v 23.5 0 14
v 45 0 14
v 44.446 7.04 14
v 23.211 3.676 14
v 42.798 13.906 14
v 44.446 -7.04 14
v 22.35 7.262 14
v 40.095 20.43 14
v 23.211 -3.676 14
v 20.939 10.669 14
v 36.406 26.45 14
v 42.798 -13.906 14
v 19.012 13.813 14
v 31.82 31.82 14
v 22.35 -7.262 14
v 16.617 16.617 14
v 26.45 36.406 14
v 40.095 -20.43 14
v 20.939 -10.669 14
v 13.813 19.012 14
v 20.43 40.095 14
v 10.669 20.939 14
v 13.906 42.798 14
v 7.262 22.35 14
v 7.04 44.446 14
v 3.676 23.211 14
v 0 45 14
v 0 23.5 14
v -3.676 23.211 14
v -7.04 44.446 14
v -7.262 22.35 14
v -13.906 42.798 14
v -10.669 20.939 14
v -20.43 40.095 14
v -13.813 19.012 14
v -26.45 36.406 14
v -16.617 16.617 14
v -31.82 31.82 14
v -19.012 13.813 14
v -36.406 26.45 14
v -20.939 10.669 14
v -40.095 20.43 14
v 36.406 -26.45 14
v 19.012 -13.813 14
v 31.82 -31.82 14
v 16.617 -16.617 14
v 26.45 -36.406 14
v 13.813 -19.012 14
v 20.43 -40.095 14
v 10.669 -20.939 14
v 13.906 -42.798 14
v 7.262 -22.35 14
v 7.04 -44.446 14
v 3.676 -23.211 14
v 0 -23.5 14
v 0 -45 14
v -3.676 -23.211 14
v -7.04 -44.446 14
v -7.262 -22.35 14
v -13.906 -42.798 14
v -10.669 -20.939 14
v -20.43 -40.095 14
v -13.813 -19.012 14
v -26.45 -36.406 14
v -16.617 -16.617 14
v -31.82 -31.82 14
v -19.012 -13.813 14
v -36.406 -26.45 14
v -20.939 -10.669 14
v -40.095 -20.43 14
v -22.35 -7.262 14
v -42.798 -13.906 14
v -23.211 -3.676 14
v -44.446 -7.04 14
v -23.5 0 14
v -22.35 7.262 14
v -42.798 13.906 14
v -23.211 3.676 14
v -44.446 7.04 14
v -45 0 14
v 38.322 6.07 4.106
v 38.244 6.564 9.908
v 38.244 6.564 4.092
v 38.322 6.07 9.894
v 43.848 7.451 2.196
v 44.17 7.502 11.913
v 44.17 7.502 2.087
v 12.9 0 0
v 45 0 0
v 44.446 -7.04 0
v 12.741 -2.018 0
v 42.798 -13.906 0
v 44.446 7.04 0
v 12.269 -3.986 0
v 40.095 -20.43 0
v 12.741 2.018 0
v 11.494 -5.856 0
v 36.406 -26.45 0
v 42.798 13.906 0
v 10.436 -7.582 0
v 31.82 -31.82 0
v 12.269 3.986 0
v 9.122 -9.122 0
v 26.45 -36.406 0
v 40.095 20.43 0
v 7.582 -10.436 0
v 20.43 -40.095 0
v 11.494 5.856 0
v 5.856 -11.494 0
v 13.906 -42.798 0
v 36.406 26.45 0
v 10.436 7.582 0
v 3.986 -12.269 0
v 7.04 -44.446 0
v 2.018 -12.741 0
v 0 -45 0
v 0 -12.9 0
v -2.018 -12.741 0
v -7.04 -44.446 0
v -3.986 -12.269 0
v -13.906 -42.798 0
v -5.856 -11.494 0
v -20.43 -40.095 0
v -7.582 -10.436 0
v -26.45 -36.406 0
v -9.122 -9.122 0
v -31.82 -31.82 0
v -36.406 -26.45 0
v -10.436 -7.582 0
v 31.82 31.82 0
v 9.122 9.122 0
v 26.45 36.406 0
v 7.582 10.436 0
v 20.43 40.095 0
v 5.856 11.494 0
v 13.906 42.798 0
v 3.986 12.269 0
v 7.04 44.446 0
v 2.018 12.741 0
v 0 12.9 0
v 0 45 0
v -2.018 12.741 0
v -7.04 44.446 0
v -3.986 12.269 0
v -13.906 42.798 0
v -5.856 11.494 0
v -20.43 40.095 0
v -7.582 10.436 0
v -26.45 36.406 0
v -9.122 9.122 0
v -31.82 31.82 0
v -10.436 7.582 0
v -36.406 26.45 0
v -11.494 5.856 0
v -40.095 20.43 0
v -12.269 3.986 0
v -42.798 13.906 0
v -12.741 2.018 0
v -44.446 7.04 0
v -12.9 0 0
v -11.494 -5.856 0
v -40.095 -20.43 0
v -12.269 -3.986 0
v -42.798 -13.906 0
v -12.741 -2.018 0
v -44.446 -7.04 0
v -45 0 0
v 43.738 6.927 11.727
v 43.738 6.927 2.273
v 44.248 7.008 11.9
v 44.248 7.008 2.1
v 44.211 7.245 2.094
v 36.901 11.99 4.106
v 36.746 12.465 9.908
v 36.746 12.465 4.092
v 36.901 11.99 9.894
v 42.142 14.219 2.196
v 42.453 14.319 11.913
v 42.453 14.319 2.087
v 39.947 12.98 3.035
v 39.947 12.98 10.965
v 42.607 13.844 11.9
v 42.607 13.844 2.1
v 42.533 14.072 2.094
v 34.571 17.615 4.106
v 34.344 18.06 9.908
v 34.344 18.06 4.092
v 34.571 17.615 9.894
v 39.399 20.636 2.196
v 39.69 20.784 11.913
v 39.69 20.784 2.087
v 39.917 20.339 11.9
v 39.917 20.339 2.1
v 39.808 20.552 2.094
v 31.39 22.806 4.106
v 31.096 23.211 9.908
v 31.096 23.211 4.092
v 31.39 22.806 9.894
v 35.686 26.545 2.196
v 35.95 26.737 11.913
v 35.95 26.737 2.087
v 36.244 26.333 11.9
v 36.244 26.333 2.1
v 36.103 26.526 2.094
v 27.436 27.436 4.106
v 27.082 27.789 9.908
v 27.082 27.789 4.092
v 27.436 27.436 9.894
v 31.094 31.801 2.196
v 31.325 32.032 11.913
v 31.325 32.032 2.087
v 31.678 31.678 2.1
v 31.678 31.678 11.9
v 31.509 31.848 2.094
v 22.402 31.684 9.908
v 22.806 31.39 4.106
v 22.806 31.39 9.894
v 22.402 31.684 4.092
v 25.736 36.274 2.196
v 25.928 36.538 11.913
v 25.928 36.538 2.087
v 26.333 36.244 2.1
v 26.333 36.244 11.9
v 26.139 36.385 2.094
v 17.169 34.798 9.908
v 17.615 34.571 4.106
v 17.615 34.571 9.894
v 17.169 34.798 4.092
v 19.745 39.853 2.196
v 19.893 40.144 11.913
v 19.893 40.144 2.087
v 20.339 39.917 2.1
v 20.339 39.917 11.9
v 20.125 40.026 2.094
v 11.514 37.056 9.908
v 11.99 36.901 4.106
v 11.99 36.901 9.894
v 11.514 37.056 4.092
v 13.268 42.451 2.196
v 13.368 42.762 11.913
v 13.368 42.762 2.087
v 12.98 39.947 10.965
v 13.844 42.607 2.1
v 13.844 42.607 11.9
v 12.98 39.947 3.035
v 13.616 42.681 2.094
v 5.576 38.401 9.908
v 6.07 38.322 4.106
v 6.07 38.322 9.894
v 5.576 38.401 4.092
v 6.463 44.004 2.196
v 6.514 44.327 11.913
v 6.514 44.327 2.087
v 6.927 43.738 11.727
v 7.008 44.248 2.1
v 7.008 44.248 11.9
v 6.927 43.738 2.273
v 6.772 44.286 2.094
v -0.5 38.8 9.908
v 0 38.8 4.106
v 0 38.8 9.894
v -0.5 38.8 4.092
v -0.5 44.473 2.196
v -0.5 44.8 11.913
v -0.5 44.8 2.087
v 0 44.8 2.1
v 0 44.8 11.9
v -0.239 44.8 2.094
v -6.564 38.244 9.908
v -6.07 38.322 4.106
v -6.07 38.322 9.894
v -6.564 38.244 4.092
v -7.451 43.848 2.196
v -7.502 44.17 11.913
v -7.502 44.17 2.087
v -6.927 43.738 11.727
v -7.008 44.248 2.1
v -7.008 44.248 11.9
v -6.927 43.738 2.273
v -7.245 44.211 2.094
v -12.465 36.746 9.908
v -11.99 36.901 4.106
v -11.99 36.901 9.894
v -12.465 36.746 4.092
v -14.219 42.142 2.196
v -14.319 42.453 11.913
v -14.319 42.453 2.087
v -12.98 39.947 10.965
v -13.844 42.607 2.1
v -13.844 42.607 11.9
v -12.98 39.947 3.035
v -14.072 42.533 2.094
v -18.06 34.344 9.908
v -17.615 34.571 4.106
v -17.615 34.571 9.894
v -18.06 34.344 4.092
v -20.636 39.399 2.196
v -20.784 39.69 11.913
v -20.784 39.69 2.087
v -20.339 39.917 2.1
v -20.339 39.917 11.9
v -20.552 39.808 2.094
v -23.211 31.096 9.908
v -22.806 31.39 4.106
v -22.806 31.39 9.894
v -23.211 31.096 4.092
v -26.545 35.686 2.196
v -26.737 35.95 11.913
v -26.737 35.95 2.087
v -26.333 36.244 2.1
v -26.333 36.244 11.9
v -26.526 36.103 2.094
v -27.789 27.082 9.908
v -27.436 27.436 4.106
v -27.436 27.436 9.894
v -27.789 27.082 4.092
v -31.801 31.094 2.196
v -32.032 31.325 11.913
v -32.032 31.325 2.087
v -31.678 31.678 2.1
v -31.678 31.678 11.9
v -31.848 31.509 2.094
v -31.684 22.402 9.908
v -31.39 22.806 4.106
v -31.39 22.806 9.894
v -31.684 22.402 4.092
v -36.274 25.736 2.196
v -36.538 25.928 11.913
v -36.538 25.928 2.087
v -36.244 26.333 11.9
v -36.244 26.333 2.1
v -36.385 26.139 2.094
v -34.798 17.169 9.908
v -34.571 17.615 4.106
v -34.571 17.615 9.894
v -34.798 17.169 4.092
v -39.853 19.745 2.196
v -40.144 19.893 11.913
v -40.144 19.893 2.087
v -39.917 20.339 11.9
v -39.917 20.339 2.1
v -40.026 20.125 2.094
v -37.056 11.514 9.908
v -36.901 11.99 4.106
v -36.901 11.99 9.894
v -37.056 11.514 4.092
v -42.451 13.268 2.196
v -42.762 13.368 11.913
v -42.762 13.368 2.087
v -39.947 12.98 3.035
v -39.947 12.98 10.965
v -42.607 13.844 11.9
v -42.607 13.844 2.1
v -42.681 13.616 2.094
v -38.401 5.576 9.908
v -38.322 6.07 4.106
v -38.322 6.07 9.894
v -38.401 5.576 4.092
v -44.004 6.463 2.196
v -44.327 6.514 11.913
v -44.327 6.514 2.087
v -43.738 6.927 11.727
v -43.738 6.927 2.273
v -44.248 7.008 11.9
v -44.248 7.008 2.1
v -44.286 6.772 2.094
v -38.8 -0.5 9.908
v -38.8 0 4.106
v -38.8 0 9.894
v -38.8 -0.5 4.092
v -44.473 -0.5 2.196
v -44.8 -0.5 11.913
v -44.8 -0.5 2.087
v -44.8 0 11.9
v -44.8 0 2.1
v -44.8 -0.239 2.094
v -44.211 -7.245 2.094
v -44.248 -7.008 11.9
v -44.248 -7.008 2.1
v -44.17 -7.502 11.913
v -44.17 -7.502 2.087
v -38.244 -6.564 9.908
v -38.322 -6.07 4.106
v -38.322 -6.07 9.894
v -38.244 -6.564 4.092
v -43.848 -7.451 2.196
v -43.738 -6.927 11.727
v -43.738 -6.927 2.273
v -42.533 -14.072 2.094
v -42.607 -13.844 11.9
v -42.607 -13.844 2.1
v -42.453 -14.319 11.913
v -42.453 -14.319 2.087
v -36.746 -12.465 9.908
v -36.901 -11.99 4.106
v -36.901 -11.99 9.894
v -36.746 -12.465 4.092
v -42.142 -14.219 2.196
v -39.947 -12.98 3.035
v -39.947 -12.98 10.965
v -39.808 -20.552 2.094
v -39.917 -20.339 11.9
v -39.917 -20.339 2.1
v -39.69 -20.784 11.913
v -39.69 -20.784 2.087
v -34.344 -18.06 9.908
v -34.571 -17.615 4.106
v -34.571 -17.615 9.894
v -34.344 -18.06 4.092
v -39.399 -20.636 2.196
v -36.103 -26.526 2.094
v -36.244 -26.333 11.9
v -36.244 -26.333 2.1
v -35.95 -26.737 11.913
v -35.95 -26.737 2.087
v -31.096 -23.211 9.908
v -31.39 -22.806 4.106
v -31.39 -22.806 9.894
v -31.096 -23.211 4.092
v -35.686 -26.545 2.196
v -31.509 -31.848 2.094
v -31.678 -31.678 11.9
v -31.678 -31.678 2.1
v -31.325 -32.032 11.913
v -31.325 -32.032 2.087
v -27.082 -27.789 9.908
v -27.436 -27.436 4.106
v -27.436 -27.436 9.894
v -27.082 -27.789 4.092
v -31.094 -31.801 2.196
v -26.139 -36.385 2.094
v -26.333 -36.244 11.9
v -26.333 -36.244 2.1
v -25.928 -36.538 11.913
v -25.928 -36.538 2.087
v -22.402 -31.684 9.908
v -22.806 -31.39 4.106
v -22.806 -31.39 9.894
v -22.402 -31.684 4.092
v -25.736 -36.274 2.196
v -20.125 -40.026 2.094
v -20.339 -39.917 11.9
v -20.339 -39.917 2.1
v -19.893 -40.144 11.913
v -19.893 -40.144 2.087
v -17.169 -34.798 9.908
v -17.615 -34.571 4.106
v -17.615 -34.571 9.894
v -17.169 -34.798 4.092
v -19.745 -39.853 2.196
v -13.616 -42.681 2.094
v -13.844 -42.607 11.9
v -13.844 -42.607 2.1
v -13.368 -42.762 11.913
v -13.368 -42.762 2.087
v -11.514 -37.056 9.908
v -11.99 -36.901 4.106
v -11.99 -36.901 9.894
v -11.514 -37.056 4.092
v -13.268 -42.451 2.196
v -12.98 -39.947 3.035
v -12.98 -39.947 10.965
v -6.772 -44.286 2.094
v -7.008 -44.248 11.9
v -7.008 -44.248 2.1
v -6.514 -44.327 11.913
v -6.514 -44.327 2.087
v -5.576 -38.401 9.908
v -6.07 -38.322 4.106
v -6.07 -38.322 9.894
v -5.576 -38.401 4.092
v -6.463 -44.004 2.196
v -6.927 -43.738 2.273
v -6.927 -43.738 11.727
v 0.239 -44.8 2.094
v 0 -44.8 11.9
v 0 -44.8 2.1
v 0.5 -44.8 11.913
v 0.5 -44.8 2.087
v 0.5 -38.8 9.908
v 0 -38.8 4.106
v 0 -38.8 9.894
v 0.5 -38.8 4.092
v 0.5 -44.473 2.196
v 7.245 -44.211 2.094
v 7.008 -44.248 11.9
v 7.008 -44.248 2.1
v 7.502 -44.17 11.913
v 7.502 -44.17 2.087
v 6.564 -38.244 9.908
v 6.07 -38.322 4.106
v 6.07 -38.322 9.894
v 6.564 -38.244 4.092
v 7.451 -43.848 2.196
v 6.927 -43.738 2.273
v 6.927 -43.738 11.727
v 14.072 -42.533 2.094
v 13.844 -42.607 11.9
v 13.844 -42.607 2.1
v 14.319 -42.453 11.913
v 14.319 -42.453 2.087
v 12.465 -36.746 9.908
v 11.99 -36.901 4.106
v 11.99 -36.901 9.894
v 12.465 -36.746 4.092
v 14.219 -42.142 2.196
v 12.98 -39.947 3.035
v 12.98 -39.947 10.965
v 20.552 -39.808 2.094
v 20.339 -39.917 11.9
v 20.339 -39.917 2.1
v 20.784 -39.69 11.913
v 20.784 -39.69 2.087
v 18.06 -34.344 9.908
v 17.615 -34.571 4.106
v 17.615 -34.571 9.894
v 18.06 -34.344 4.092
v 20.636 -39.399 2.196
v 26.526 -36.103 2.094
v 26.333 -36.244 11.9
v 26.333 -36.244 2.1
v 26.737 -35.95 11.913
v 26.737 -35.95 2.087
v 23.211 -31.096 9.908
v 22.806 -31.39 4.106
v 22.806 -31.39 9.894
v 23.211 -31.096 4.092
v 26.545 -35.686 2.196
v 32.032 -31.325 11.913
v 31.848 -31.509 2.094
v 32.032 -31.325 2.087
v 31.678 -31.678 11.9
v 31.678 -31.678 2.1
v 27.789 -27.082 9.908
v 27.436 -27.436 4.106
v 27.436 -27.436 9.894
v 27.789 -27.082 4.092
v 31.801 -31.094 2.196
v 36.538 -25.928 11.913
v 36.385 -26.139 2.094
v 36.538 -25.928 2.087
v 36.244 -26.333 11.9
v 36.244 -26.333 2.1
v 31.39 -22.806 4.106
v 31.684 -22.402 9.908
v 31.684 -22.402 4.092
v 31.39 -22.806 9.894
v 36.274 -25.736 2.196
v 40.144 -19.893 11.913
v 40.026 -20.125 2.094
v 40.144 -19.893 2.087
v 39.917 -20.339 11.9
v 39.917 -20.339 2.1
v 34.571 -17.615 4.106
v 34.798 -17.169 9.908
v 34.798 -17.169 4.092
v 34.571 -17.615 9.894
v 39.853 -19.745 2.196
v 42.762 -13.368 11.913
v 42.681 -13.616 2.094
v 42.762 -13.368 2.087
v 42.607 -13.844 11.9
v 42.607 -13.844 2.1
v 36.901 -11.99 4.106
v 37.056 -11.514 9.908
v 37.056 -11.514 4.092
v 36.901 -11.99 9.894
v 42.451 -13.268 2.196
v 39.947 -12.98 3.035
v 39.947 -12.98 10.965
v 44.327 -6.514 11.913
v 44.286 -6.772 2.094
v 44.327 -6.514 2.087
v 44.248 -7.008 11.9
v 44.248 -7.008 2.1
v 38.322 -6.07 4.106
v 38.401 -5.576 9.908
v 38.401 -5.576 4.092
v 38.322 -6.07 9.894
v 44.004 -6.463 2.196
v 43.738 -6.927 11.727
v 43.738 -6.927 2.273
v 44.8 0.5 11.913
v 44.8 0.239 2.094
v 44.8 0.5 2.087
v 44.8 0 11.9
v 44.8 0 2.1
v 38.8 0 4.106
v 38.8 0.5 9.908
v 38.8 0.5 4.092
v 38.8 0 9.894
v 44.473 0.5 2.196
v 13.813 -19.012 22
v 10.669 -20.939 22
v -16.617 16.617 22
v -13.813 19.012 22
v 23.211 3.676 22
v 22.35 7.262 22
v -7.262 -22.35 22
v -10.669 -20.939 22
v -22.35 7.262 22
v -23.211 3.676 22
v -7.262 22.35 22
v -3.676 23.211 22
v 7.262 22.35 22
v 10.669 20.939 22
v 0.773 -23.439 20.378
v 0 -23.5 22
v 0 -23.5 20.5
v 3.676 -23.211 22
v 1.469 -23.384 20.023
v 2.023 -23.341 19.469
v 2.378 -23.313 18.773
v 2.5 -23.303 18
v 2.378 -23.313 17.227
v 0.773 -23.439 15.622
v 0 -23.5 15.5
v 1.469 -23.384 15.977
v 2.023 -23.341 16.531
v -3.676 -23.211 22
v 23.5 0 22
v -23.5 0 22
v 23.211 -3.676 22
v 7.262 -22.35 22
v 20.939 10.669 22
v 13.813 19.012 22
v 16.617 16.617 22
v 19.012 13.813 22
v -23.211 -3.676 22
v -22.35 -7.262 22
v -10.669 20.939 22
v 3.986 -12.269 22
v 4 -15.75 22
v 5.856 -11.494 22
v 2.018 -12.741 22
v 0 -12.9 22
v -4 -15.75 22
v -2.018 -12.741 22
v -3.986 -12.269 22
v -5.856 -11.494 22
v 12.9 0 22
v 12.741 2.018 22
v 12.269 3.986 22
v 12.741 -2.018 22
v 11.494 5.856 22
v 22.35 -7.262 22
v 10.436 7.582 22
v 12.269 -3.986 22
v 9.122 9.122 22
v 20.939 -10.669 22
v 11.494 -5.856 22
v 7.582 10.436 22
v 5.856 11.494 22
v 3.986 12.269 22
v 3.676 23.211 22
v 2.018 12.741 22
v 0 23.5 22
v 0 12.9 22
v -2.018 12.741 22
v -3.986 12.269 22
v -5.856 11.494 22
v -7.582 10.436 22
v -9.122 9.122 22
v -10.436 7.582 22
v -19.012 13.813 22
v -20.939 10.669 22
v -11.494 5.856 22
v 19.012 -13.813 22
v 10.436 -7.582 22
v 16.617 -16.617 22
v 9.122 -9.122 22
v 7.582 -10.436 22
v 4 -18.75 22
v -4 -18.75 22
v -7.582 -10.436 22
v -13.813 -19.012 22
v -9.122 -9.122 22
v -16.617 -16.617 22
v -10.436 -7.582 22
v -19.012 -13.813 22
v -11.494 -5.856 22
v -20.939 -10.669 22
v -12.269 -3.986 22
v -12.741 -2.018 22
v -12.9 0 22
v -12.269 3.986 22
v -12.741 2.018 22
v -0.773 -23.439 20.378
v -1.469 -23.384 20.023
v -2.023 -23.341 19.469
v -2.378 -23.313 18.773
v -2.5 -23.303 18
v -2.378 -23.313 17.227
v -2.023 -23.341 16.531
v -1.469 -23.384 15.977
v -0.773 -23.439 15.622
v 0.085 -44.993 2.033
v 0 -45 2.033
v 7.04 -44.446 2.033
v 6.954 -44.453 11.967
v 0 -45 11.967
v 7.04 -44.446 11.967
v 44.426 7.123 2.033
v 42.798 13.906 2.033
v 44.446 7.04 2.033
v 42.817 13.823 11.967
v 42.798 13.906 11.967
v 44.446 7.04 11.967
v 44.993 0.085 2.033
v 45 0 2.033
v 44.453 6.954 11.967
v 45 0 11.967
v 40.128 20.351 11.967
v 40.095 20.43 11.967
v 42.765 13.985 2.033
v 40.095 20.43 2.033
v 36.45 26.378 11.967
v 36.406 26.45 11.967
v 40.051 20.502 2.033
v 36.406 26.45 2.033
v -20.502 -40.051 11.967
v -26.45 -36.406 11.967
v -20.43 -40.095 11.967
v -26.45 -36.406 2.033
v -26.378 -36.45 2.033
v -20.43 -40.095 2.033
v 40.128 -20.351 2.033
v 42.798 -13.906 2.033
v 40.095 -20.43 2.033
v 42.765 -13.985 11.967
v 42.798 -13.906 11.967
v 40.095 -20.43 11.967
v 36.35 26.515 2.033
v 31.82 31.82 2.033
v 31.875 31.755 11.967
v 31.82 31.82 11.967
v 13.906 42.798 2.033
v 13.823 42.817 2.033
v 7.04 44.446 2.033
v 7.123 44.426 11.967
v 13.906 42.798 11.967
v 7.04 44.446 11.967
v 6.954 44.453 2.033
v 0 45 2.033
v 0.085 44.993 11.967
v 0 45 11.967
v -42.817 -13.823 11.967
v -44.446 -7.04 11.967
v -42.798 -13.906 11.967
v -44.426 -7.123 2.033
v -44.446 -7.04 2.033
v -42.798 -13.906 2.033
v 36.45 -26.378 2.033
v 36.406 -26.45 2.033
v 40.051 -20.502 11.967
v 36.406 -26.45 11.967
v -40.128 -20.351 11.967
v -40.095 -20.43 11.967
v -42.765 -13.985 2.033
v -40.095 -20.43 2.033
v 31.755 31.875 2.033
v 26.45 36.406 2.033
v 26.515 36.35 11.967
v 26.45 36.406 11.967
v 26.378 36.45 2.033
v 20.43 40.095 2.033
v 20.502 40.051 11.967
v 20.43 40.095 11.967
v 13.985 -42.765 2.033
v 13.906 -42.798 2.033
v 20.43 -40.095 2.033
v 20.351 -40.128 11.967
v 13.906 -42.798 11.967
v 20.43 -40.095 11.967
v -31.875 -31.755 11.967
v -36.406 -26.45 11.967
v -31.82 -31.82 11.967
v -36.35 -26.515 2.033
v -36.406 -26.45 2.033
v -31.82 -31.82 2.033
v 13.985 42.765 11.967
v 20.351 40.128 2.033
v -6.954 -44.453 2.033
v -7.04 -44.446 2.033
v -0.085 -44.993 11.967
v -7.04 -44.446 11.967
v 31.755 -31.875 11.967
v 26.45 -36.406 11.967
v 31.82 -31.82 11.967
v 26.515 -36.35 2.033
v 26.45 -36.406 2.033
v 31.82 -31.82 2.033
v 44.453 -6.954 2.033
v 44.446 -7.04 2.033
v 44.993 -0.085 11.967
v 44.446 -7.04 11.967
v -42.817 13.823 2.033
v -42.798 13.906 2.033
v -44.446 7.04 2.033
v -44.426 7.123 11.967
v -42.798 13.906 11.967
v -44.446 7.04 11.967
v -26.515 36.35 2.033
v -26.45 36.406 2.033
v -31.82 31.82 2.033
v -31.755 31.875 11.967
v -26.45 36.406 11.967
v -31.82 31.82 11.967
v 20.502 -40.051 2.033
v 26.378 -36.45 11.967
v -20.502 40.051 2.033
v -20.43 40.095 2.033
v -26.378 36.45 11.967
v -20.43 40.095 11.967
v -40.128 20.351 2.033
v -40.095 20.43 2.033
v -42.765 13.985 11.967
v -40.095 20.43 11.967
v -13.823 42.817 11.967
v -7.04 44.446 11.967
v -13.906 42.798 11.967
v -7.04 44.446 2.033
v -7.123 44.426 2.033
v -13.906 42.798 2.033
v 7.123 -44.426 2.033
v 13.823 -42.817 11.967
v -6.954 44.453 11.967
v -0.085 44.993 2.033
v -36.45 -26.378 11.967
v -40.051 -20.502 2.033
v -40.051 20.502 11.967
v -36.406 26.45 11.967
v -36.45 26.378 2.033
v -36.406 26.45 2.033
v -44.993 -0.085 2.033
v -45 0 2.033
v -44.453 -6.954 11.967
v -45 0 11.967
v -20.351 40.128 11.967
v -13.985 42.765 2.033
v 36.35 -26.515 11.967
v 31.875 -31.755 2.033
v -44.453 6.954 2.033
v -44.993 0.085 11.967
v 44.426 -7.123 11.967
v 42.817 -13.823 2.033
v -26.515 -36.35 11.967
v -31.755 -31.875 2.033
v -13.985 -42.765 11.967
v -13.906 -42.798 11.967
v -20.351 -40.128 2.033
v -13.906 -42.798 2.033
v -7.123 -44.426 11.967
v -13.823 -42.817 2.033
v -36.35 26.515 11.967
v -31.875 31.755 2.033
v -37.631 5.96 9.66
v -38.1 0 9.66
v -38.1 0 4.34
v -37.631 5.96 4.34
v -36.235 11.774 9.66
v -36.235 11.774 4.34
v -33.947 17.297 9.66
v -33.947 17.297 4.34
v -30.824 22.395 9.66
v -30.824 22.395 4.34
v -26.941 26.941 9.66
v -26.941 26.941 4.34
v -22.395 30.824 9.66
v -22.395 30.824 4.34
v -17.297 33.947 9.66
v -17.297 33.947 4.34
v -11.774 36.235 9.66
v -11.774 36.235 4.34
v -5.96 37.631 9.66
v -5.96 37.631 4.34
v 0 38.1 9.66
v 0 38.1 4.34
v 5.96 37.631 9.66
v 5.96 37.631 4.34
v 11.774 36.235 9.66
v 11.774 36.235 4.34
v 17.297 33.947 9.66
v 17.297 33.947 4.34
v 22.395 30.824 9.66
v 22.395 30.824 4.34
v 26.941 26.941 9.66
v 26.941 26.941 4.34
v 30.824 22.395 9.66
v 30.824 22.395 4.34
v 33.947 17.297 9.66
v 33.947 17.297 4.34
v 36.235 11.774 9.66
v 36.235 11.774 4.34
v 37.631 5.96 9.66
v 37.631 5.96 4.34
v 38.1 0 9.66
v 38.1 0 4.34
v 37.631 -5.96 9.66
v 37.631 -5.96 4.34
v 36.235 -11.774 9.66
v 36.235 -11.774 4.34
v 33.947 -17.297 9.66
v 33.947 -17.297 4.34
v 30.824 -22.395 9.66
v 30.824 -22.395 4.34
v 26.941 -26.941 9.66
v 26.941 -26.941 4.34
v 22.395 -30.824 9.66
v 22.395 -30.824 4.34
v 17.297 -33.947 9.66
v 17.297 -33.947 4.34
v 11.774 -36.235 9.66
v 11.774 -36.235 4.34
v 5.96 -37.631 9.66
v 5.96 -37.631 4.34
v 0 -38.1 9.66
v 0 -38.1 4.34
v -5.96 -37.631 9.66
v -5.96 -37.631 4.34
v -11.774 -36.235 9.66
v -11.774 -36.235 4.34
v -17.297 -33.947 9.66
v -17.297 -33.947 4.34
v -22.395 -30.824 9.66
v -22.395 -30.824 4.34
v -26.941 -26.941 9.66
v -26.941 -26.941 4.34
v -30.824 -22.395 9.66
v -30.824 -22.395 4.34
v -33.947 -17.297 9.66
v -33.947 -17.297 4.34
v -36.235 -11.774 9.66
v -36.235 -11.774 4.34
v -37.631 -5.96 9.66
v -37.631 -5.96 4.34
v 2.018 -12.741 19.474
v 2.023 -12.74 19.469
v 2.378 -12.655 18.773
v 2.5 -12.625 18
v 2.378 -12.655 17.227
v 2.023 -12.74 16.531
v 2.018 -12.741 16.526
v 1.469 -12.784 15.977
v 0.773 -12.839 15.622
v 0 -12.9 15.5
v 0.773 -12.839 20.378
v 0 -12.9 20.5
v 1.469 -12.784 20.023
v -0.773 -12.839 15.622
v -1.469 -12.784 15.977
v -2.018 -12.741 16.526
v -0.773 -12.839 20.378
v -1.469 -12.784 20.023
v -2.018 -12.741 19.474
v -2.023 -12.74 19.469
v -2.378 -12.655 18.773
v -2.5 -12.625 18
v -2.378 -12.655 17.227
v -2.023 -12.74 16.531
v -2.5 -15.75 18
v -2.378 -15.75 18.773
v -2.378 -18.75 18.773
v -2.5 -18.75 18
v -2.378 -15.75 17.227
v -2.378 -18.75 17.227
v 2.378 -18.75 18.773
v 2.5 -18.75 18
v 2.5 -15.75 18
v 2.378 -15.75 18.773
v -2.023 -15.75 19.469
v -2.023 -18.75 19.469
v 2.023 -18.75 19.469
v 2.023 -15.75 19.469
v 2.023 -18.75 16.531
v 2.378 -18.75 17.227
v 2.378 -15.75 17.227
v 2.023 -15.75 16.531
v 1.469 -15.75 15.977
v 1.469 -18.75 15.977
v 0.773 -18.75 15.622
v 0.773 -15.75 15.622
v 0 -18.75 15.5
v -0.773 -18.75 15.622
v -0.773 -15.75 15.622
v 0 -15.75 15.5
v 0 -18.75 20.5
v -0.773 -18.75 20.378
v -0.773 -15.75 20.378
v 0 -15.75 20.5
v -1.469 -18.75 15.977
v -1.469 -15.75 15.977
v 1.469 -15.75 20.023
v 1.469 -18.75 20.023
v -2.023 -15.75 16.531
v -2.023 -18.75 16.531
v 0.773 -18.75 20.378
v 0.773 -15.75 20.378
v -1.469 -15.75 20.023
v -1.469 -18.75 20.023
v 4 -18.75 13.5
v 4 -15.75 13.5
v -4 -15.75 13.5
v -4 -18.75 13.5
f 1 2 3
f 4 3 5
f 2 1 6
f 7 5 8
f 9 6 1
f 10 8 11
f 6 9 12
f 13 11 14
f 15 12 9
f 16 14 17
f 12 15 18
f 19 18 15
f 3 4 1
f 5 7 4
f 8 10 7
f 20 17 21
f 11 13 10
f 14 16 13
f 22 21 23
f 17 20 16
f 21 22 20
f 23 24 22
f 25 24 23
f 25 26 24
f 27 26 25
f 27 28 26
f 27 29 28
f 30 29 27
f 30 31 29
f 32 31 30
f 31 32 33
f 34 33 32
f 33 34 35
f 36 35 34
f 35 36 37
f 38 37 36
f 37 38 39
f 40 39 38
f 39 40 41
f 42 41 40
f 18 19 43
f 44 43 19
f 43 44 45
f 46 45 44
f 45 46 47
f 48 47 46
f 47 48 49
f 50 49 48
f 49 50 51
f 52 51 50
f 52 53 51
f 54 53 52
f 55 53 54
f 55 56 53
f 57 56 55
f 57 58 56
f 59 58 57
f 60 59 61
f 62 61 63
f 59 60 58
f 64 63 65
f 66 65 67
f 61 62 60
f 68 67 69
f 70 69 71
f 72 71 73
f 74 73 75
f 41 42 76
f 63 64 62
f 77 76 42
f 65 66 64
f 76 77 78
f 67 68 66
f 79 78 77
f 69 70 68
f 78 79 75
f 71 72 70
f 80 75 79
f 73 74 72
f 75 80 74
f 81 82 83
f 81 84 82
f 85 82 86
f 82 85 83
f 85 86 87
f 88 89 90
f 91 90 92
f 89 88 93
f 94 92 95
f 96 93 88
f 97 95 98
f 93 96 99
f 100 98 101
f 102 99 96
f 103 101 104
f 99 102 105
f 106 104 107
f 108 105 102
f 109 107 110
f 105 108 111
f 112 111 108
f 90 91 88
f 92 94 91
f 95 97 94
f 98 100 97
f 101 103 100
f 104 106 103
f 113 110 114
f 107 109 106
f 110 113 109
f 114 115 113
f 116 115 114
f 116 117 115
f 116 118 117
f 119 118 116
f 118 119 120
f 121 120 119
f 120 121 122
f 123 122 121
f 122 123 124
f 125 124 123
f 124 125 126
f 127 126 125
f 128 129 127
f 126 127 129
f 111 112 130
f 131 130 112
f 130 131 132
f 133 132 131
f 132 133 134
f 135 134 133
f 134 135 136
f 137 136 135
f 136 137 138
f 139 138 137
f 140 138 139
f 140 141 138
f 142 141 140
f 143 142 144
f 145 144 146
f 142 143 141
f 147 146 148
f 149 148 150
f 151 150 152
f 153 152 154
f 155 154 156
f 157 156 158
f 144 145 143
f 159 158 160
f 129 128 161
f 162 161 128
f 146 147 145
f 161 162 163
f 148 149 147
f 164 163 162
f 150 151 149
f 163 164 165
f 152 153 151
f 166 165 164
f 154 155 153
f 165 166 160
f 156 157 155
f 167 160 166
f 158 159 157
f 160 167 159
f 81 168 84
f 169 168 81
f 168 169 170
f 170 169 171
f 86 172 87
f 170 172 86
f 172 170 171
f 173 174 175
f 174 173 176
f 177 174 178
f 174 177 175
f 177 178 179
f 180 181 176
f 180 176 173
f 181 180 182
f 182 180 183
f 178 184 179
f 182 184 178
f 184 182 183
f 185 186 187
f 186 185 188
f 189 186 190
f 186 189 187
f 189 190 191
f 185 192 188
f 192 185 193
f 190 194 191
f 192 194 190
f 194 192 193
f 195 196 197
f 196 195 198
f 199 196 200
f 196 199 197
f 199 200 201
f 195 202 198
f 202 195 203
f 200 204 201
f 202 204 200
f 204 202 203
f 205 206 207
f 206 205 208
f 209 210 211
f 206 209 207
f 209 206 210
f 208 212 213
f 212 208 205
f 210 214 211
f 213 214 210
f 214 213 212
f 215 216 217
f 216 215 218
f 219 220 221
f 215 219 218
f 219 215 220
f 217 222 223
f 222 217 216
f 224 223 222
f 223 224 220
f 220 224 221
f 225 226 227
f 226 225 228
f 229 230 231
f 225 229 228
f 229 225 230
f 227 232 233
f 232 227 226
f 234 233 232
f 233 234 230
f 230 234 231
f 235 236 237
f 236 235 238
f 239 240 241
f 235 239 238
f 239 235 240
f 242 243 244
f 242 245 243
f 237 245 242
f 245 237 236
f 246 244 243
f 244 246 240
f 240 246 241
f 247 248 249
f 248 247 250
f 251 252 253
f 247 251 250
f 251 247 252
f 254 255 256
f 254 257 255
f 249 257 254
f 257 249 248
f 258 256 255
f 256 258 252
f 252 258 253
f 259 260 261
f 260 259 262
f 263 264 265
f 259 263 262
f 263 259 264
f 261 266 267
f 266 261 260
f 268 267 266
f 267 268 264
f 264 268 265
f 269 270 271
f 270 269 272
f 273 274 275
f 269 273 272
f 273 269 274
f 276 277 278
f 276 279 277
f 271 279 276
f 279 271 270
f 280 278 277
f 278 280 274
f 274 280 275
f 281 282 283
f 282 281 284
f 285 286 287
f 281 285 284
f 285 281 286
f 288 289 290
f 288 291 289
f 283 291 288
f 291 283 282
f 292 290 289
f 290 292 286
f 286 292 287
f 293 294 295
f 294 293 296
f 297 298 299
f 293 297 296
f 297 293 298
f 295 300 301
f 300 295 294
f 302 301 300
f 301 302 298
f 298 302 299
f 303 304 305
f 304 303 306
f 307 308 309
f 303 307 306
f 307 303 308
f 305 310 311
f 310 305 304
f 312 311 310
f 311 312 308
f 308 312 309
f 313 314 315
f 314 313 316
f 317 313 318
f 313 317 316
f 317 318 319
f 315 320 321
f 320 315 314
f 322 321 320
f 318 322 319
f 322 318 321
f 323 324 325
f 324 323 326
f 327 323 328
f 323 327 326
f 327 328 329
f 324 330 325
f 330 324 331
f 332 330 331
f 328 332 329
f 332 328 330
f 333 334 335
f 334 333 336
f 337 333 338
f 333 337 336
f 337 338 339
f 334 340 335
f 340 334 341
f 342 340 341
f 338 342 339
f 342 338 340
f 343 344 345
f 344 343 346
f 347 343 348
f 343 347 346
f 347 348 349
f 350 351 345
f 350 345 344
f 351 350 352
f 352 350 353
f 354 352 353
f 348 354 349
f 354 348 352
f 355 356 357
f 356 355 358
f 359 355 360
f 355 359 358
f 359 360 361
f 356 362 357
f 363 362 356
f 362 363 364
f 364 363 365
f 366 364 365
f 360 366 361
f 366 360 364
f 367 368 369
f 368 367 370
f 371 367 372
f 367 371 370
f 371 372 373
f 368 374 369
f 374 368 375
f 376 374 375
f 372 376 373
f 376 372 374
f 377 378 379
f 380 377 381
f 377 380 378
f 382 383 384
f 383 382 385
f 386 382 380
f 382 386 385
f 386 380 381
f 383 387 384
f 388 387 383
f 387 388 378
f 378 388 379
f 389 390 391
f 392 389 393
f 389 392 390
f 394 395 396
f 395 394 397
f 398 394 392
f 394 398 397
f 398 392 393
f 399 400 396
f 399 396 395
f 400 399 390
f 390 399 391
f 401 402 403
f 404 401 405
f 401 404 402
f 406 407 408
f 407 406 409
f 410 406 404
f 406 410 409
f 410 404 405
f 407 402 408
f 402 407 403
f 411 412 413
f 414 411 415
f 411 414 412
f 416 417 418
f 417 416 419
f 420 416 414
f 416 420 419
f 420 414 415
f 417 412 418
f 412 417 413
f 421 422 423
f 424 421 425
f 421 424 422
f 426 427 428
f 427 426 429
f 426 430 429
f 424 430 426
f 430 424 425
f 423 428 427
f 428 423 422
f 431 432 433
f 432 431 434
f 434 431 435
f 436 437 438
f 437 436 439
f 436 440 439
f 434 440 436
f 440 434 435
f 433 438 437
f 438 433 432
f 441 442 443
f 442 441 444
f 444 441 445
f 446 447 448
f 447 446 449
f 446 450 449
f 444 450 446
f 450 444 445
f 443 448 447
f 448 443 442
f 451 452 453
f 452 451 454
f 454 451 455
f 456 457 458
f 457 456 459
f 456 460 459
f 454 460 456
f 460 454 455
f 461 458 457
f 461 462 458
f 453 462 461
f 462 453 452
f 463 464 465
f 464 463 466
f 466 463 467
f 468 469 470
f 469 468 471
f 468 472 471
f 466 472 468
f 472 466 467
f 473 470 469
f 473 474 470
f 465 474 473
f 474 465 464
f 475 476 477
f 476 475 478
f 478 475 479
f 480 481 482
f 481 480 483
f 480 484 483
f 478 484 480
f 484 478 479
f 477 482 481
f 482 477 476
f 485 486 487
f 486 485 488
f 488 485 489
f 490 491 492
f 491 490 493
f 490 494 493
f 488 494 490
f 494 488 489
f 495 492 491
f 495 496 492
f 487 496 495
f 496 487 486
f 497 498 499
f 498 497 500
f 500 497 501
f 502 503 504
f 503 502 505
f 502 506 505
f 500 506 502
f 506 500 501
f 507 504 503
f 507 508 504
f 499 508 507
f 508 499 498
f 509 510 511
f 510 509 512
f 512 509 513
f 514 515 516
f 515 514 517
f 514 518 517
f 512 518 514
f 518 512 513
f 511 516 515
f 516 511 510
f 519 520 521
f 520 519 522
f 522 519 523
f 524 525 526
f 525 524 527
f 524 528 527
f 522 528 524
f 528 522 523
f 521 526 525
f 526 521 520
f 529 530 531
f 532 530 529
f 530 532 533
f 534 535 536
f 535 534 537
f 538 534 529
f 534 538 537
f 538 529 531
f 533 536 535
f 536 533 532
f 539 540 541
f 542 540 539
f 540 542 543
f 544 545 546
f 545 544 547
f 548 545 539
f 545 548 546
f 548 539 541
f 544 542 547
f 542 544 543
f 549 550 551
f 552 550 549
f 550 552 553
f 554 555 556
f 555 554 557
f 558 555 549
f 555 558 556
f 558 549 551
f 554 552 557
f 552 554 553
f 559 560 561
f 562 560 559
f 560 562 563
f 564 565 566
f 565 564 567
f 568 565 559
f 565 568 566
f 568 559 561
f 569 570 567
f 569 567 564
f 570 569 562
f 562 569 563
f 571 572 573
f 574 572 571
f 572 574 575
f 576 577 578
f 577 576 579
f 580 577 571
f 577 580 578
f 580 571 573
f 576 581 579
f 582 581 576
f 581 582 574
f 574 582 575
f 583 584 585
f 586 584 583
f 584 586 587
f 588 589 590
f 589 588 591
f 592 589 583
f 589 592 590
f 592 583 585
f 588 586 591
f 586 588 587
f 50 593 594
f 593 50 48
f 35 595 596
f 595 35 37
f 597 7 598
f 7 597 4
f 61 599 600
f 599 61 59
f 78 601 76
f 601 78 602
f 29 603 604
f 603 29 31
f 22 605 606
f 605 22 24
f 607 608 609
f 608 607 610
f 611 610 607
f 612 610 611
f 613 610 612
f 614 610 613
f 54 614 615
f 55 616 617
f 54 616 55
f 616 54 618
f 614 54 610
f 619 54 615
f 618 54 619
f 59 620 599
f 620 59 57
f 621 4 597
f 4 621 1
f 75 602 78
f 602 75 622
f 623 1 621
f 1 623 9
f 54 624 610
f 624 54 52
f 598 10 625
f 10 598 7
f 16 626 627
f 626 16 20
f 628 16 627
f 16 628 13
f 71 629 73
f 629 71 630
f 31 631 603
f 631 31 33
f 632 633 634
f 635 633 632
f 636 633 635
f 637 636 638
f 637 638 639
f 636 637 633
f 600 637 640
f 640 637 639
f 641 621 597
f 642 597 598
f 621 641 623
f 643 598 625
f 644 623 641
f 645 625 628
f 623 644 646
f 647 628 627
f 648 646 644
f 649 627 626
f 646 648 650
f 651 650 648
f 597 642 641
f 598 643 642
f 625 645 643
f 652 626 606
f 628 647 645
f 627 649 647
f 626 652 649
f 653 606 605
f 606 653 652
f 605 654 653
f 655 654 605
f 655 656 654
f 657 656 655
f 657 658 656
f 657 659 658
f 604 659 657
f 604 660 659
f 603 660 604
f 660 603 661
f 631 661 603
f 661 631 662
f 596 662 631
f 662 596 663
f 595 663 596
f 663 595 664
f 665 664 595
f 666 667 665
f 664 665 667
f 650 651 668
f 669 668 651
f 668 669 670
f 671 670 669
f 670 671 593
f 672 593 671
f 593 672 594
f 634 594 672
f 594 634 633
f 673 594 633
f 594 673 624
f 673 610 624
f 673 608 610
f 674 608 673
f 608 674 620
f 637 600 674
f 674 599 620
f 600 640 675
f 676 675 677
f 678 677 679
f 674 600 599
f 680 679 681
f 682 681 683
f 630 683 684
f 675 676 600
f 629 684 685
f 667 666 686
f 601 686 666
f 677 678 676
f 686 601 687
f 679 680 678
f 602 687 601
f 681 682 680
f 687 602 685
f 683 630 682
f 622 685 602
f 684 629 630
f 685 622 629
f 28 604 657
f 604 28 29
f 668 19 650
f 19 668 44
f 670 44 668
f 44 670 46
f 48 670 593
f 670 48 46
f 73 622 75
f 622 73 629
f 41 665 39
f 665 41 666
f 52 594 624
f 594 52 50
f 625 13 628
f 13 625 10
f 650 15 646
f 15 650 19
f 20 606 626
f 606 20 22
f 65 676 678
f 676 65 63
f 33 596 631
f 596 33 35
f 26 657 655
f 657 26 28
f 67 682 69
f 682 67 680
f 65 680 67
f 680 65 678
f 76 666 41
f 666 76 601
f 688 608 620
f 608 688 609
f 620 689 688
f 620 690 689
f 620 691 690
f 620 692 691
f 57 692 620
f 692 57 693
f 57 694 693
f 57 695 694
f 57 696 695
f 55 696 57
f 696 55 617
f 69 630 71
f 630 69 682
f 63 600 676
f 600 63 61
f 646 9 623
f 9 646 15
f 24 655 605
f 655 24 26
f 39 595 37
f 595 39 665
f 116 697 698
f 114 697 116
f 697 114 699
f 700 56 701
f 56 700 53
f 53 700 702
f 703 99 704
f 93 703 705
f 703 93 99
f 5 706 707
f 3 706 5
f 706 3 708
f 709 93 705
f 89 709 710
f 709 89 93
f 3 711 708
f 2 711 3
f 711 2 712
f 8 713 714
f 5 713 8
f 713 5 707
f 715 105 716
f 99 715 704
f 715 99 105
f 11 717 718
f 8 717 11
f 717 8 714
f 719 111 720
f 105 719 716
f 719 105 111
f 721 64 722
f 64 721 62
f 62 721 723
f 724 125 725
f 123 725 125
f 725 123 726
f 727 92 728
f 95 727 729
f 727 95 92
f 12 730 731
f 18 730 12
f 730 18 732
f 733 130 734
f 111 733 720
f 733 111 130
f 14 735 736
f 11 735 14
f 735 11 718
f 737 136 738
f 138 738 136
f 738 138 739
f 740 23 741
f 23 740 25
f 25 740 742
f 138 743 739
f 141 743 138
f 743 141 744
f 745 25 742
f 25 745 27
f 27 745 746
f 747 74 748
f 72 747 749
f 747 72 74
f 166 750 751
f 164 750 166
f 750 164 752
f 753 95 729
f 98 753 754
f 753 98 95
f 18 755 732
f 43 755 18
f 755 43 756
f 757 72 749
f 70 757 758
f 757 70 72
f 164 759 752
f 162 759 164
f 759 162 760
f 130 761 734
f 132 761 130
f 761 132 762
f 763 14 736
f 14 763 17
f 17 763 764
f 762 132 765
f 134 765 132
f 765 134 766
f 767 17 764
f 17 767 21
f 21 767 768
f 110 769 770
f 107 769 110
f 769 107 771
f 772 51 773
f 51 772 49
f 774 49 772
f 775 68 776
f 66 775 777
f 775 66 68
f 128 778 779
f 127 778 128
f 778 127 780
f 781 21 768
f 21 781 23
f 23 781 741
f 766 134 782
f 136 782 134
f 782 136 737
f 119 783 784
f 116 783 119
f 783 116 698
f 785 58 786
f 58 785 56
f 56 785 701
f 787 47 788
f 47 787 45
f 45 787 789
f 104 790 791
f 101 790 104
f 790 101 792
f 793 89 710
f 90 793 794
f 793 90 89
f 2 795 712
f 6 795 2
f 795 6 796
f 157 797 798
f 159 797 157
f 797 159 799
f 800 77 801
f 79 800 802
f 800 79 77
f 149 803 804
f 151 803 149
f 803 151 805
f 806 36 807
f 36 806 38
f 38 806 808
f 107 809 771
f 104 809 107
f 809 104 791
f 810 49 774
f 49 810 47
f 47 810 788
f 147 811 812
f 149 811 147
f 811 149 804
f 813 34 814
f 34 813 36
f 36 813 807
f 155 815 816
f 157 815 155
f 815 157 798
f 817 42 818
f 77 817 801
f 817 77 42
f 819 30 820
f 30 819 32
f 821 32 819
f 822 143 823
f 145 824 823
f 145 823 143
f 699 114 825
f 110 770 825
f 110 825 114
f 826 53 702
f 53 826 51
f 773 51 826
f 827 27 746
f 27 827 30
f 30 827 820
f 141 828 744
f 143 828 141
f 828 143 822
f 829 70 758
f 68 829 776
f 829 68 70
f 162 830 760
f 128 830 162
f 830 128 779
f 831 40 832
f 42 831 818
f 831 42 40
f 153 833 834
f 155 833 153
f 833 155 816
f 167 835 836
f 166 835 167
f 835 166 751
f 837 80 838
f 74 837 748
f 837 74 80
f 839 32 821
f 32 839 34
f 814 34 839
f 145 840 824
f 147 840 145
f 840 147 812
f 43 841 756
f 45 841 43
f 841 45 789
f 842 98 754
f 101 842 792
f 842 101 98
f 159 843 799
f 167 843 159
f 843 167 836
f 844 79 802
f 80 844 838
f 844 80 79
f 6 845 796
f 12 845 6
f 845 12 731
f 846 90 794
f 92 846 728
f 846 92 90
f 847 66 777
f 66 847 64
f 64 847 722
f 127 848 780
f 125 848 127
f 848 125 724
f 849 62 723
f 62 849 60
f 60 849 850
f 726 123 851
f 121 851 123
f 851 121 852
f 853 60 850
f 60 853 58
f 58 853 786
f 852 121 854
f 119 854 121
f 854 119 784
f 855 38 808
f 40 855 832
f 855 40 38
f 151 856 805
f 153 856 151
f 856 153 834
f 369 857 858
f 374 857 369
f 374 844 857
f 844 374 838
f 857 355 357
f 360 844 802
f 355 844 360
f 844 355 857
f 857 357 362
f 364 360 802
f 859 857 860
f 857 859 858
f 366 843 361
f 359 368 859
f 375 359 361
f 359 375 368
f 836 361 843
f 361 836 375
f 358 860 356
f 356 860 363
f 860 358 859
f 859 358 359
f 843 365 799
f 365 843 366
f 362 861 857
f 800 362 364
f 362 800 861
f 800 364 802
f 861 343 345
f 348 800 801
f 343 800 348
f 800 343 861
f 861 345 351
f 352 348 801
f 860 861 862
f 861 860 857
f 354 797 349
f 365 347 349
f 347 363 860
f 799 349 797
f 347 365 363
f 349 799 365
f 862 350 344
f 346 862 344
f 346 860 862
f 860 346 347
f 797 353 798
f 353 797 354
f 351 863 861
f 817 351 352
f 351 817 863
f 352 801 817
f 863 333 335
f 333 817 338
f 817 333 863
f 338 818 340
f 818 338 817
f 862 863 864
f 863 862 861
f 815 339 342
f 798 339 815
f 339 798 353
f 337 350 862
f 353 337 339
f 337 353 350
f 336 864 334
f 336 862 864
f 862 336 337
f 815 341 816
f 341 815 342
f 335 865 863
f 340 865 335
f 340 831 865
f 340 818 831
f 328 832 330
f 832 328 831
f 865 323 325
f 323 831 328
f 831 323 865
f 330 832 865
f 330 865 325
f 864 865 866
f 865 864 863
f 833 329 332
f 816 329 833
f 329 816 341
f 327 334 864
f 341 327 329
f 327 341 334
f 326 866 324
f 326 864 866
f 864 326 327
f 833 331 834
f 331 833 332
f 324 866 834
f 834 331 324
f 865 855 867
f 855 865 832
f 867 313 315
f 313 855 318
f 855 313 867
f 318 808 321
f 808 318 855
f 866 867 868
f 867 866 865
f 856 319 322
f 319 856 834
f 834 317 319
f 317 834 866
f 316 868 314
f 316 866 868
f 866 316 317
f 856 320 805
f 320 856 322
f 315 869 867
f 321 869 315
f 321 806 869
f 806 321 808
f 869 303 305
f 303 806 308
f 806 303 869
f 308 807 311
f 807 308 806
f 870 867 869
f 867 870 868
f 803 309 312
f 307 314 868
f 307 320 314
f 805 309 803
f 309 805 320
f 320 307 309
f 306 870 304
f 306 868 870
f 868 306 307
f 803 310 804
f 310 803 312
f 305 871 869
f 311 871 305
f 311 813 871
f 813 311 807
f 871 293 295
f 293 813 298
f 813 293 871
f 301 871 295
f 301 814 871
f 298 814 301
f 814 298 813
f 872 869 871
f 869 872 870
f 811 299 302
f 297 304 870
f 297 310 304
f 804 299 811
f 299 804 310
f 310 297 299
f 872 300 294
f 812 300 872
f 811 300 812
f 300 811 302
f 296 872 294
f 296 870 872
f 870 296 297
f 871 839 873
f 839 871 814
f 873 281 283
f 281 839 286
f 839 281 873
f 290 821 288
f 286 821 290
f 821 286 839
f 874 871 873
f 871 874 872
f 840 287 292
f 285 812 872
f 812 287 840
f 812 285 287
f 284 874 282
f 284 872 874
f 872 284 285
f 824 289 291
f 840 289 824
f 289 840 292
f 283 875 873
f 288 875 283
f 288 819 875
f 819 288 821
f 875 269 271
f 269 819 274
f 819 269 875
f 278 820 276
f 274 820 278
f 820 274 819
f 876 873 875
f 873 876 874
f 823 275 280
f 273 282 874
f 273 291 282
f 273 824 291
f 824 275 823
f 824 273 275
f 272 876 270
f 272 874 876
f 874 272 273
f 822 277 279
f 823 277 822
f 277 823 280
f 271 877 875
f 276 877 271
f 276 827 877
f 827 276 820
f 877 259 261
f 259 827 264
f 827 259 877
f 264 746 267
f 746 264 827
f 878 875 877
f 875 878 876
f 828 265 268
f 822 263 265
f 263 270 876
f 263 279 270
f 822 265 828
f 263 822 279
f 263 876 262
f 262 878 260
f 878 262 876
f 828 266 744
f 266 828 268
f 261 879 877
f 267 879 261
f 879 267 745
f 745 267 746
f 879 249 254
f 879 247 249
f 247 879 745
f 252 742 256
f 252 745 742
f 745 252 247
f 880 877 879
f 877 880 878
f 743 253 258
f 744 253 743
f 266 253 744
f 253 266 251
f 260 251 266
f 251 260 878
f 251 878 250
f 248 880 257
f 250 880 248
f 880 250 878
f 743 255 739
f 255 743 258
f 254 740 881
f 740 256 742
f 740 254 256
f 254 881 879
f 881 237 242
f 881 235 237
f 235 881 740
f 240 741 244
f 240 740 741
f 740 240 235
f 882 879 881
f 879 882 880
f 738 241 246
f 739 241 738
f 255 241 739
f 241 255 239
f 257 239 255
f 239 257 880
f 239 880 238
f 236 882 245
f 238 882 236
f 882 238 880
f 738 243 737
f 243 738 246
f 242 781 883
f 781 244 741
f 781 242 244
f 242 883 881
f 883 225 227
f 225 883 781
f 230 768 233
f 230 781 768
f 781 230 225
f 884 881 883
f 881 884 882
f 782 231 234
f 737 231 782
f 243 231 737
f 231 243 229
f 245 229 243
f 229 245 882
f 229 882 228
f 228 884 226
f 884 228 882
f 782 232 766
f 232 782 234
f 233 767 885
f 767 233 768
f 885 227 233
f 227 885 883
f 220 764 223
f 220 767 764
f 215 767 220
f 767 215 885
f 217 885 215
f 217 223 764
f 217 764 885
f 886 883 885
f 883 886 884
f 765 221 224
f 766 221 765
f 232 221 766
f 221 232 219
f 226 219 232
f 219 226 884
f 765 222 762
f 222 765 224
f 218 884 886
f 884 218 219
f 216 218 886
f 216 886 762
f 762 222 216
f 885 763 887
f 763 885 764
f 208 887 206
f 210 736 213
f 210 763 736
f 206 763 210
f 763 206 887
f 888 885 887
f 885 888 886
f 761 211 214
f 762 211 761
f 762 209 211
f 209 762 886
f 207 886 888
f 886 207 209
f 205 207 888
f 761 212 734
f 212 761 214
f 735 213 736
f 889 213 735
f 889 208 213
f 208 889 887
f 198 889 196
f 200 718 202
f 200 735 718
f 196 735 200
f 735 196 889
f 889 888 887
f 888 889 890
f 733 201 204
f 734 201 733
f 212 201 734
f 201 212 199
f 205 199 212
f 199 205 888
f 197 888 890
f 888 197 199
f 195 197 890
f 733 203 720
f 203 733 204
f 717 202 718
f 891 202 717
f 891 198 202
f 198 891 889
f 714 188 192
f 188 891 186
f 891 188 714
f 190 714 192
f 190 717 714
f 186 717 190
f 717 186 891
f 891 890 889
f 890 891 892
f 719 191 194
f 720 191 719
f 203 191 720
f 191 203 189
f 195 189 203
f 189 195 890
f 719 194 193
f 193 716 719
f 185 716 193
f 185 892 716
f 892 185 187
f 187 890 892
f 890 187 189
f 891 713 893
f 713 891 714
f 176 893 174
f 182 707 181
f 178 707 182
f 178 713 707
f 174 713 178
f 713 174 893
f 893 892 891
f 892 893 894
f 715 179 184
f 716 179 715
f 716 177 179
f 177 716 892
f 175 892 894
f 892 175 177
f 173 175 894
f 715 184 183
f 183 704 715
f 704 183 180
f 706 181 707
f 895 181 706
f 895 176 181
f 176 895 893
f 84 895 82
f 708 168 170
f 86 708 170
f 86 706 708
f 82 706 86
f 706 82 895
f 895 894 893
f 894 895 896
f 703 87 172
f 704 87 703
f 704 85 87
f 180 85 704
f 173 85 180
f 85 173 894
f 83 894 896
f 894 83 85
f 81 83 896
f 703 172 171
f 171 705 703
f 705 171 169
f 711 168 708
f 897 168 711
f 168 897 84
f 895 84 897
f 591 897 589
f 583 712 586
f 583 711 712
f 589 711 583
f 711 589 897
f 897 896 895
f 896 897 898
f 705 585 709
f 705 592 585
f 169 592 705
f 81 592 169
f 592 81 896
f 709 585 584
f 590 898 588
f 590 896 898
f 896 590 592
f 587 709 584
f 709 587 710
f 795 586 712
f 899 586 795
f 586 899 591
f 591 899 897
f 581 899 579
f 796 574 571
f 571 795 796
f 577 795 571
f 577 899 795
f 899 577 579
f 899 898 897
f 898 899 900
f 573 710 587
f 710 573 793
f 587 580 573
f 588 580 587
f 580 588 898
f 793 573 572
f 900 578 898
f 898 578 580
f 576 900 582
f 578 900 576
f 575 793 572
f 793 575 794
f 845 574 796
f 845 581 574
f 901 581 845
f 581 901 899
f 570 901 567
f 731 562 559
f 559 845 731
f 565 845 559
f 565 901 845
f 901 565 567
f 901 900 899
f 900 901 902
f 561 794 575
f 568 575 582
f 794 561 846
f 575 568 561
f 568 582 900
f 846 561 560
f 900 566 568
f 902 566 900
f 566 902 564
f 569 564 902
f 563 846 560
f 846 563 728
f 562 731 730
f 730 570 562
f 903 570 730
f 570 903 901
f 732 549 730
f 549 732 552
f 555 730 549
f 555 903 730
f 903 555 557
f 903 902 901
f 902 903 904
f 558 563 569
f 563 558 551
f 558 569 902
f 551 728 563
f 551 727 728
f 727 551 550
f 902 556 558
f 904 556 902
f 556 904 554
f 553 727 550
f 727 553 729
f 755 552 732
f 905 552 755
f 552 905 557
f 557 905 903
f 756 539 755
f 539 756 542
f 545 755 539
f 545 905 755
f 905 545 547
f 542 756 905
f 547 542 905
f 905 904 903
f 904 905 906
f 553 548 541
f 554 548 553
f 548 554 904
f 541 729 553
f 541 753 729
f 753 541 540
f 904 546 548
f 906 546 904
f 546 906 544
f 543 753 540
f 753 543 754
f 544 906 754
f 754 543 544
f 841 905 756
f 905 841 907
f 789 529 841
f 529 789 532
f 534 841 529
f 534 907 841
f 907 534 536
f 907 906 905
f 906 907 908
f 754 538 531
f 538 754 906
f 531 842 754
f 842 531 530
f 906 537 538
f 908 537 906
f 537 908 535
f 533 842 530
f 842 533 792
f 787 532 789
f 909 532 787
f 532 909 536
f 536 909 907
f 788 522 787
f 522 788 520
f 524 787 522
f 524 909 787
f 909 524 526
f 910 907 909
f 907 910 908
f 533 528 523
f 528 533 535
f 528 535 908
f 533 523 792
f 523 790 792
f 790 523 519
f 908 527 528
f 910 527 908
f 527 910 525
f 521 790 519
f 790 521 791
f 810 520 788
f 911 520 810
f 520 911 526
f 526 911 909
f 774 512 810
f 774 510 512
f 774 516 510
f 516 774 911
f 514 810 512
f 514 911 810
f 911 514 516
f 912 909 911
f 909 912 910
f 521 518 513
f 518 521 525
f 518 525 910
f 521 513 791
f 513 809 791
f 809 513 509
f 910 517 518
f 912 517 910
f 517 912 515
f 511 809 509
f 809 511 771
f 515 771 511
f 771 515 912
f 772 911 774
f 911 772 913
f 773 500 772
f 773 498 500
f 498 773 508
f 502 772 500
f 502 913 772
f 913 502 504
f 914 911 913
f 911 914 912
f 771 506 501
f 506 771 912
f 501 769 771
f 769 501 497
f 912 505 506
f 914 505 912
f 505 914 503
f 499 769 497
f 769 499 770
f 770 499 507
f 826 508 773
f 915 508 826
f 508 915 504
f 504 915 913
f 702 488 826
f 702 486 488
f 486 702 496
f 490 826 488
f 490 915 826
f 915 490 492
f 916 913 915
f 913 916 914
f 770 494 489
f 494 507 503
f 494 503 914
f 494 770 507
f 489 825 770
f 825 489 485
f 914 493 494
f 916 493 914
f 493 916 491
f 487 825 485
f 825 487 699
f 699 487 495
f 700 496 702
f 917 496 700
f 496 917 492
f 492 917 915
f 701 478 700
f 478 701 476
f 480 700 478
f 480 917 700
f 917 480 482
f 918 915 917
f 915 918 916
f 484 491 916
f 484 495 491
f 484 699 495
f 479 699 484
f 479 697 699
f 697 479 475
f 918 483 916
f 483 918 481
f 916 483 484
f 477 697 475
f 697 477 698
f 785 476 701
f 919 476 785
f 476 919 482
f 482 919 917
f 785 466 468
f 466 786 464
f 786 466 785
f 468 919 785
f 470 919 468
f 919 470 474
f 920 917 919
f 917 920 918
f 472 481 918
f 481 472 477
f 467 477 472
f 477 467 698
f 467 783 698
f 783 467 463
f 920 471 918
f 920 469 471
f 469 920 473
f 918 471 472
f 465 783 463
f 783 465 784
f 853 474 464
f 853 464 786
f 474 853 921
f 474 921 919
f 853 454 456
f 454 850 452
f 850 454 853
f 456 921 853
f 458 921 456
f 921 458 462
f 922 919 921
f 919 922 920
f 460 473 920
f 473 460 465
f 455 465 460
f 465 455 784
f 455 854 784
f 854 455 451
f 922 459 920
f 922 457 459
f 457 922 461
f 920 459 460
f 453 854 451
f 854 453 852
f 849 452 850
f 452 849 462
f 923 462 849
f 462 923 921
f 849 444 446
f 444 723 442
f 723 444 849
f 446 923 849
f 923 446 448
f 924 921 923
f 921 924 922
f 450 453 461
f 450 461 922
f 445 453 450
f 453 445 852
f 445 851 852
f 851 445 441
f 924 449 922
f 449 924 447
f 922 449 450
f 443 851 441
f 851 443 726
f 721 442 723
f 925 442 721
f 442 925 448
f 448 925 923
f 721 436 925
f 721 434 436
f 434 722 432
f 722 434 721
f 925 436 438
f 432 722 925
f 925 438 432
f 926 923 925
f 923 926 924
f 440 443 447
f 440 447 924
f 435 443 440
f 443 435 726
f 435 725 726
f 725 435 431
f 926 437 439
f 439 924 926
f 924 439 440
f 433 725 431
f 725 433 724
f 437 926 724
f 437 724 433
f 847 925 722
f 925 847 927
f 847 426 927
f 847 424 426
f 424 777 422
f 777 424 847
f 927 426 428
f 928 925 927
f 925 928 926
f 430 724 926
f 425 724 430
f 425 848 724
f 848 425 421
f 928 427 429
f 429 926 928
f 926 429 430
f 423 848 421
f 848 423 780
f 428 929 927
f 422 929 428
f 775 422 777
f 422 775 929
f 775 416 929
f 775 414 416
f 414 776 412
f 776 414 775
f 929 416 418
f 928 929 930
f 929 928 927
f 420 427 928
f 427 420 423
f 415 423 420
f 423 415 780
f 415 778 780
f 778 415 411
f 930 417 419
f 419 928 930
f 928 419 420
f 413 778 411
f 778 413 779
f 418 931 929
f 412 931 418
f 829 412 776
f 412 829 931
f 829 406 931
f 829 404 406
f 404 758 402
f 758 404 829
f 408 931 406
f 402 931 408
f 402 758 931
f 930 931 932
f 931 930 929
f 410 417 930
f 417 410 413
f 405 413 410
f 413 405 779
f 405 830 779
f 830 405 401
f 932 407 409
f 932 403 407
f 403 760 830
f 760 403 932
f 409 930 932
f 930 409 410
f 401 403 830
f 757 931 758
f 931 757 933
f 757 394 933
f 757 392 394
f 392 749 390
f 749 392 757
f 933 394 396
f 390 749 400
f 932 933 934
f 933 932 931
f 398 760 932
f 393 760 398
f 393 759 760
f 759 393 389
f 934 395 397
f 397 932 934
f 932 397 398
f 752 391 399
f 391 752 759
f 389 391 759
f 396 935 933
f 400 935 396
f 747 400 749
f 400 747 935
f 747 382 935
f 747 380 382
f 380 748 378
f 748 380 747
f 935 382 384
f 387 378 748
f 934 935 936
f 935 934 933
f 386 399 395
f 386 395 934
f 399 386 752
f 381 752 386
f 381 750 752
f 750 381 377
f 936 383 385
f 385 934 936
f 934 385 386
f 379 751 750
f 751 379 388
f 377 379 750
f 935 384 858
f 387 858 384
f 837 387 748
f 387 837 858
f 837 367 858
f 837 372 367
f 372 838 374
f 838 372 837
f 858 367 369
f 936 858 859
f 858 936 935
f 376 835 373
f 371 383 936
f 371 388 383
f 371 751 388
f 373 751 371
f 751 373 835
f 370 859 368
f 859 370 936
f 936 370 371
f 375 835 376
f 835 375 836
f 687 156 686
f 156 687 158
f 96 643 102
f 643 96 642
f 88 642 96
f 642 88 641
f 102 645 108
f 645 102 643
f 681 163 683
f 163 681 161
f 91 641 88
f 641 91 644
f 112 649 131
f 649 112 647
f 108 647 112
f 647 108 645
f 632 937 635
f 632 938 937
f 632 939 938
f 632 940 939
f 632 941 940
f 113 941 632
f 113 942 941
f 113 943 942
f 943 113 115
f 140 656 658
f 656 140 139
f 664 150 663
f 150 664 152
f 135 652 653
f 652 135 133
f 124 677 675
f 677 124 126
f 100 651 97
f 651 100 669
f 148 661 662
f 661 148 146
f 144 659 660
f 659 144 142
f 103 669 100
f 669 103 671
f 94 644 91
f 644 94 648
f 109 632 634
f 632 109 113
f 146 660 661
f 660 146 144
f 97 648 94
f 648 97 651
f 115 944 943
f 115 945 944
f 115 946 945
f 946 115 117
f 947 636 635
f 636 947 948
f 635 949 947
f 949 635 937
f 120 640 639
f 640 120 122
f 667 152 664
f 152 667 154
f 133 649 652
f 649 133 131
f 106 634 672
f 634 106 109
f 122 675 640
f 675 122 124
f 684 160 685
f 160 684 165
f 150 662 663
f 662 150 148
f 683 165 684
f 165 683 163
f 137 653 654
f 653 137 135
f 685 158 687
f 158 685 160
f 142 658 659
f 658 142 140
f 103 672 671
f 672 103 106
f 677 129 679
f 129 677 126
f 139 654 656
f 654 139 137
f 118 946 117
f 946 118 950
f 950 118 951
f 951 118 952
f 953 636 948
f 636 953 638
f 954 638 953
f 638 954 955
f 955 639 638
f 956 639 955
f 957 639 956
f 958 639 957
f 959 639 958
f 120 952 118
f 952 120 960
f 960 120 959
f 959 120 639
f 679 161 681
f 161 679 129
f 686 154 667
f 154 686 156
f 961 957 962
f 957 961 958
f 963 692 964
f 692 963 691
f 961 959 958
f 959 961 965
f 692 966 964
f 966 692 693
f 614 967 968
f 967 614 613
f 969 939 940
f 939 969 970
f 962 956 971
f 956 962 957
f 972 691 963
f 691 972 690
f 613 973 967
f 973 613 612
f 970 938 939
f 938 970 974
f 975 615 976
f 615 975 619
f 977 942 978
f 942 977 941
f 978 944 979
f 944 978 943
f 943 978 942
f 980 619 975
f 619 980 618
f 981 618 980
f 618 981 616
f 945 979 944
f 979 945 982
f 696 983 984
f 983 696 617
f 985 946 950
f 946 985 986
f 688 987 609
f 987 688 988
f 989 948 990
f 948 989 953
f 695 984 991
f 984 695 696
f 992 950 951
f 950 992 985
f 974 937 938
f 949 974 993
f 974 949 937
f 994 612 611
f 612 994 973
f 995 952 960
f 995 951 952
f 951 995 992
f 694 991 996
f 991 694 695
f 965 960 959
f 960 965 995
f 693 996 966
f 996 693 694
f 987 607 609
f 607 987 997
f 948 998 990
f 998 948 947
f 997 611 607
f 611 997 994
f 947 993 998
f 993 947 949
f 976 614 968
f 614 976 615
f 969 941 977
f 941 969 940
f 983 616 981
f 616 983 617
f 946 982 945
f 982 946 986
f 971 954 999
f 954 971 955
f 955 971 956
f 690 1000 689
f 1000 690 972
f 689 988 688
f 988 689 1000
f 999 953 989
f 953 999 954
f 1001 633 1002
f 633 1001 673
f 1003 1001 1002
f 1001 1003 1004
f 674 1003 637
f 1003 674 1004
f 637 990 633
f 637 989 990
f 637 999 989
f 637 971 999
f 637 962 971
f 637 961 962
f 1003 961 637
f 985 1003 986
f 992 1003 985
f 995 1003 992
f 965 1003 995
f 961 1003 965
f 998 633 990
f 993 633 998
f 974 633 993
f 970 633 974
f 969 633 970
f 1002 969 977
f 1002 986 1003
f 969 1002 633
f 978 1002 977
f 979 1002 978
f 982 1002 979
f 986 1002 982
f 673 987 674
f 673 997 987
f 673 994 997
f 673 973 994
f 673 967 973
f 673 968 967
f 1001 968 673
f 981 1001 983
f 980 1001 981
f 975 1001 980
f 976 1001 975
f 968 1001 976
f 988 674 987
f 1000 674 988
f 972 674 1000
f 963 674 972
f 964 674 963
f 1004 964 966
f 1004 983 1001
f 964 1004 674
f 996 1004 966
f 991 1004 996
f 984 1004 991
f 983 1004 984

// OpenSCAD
$fn = 40;
d = 90;

//translate([4,-2,0])
//      cube([4,4,25]);

rr = 38.8;
for(i=[1:40])
{
  translate([rr*cos(i*360/40),rr*sin(i*360/40),0])
    rotate([0,0,i*360/40])
    cube([6,.5,14]);
}

difference()
{
  union()
  {
    cylinder(d=40+2+4+1, h=20+2);
    cylinder(d=d, h=12+2);
    
  }

translate([0,0,2])
rotate_extrude(convexity=10)
translate([d/2-6.9,0,0])
//rotate([0,90,0])
//circle(r=5, $fn=4);
  profile();
  
  cylinder(d=25.4+.4, h=25);
  
  
  translate([0,0,16+1+1])
  rotate([90,0,0])
  cylinder(d=3.5+1.5, h=200, $fn=20);
  
  translate([-8/2,-18.5+.5-.75,12+1.5])
    cube([8,4-1,25]);
}

module profile()
{
    ang = 40;
    polygon(points=[[0,10*cos(ang)], [7,10], [7,0], [0,10-10*cos(ang)]]);
}
